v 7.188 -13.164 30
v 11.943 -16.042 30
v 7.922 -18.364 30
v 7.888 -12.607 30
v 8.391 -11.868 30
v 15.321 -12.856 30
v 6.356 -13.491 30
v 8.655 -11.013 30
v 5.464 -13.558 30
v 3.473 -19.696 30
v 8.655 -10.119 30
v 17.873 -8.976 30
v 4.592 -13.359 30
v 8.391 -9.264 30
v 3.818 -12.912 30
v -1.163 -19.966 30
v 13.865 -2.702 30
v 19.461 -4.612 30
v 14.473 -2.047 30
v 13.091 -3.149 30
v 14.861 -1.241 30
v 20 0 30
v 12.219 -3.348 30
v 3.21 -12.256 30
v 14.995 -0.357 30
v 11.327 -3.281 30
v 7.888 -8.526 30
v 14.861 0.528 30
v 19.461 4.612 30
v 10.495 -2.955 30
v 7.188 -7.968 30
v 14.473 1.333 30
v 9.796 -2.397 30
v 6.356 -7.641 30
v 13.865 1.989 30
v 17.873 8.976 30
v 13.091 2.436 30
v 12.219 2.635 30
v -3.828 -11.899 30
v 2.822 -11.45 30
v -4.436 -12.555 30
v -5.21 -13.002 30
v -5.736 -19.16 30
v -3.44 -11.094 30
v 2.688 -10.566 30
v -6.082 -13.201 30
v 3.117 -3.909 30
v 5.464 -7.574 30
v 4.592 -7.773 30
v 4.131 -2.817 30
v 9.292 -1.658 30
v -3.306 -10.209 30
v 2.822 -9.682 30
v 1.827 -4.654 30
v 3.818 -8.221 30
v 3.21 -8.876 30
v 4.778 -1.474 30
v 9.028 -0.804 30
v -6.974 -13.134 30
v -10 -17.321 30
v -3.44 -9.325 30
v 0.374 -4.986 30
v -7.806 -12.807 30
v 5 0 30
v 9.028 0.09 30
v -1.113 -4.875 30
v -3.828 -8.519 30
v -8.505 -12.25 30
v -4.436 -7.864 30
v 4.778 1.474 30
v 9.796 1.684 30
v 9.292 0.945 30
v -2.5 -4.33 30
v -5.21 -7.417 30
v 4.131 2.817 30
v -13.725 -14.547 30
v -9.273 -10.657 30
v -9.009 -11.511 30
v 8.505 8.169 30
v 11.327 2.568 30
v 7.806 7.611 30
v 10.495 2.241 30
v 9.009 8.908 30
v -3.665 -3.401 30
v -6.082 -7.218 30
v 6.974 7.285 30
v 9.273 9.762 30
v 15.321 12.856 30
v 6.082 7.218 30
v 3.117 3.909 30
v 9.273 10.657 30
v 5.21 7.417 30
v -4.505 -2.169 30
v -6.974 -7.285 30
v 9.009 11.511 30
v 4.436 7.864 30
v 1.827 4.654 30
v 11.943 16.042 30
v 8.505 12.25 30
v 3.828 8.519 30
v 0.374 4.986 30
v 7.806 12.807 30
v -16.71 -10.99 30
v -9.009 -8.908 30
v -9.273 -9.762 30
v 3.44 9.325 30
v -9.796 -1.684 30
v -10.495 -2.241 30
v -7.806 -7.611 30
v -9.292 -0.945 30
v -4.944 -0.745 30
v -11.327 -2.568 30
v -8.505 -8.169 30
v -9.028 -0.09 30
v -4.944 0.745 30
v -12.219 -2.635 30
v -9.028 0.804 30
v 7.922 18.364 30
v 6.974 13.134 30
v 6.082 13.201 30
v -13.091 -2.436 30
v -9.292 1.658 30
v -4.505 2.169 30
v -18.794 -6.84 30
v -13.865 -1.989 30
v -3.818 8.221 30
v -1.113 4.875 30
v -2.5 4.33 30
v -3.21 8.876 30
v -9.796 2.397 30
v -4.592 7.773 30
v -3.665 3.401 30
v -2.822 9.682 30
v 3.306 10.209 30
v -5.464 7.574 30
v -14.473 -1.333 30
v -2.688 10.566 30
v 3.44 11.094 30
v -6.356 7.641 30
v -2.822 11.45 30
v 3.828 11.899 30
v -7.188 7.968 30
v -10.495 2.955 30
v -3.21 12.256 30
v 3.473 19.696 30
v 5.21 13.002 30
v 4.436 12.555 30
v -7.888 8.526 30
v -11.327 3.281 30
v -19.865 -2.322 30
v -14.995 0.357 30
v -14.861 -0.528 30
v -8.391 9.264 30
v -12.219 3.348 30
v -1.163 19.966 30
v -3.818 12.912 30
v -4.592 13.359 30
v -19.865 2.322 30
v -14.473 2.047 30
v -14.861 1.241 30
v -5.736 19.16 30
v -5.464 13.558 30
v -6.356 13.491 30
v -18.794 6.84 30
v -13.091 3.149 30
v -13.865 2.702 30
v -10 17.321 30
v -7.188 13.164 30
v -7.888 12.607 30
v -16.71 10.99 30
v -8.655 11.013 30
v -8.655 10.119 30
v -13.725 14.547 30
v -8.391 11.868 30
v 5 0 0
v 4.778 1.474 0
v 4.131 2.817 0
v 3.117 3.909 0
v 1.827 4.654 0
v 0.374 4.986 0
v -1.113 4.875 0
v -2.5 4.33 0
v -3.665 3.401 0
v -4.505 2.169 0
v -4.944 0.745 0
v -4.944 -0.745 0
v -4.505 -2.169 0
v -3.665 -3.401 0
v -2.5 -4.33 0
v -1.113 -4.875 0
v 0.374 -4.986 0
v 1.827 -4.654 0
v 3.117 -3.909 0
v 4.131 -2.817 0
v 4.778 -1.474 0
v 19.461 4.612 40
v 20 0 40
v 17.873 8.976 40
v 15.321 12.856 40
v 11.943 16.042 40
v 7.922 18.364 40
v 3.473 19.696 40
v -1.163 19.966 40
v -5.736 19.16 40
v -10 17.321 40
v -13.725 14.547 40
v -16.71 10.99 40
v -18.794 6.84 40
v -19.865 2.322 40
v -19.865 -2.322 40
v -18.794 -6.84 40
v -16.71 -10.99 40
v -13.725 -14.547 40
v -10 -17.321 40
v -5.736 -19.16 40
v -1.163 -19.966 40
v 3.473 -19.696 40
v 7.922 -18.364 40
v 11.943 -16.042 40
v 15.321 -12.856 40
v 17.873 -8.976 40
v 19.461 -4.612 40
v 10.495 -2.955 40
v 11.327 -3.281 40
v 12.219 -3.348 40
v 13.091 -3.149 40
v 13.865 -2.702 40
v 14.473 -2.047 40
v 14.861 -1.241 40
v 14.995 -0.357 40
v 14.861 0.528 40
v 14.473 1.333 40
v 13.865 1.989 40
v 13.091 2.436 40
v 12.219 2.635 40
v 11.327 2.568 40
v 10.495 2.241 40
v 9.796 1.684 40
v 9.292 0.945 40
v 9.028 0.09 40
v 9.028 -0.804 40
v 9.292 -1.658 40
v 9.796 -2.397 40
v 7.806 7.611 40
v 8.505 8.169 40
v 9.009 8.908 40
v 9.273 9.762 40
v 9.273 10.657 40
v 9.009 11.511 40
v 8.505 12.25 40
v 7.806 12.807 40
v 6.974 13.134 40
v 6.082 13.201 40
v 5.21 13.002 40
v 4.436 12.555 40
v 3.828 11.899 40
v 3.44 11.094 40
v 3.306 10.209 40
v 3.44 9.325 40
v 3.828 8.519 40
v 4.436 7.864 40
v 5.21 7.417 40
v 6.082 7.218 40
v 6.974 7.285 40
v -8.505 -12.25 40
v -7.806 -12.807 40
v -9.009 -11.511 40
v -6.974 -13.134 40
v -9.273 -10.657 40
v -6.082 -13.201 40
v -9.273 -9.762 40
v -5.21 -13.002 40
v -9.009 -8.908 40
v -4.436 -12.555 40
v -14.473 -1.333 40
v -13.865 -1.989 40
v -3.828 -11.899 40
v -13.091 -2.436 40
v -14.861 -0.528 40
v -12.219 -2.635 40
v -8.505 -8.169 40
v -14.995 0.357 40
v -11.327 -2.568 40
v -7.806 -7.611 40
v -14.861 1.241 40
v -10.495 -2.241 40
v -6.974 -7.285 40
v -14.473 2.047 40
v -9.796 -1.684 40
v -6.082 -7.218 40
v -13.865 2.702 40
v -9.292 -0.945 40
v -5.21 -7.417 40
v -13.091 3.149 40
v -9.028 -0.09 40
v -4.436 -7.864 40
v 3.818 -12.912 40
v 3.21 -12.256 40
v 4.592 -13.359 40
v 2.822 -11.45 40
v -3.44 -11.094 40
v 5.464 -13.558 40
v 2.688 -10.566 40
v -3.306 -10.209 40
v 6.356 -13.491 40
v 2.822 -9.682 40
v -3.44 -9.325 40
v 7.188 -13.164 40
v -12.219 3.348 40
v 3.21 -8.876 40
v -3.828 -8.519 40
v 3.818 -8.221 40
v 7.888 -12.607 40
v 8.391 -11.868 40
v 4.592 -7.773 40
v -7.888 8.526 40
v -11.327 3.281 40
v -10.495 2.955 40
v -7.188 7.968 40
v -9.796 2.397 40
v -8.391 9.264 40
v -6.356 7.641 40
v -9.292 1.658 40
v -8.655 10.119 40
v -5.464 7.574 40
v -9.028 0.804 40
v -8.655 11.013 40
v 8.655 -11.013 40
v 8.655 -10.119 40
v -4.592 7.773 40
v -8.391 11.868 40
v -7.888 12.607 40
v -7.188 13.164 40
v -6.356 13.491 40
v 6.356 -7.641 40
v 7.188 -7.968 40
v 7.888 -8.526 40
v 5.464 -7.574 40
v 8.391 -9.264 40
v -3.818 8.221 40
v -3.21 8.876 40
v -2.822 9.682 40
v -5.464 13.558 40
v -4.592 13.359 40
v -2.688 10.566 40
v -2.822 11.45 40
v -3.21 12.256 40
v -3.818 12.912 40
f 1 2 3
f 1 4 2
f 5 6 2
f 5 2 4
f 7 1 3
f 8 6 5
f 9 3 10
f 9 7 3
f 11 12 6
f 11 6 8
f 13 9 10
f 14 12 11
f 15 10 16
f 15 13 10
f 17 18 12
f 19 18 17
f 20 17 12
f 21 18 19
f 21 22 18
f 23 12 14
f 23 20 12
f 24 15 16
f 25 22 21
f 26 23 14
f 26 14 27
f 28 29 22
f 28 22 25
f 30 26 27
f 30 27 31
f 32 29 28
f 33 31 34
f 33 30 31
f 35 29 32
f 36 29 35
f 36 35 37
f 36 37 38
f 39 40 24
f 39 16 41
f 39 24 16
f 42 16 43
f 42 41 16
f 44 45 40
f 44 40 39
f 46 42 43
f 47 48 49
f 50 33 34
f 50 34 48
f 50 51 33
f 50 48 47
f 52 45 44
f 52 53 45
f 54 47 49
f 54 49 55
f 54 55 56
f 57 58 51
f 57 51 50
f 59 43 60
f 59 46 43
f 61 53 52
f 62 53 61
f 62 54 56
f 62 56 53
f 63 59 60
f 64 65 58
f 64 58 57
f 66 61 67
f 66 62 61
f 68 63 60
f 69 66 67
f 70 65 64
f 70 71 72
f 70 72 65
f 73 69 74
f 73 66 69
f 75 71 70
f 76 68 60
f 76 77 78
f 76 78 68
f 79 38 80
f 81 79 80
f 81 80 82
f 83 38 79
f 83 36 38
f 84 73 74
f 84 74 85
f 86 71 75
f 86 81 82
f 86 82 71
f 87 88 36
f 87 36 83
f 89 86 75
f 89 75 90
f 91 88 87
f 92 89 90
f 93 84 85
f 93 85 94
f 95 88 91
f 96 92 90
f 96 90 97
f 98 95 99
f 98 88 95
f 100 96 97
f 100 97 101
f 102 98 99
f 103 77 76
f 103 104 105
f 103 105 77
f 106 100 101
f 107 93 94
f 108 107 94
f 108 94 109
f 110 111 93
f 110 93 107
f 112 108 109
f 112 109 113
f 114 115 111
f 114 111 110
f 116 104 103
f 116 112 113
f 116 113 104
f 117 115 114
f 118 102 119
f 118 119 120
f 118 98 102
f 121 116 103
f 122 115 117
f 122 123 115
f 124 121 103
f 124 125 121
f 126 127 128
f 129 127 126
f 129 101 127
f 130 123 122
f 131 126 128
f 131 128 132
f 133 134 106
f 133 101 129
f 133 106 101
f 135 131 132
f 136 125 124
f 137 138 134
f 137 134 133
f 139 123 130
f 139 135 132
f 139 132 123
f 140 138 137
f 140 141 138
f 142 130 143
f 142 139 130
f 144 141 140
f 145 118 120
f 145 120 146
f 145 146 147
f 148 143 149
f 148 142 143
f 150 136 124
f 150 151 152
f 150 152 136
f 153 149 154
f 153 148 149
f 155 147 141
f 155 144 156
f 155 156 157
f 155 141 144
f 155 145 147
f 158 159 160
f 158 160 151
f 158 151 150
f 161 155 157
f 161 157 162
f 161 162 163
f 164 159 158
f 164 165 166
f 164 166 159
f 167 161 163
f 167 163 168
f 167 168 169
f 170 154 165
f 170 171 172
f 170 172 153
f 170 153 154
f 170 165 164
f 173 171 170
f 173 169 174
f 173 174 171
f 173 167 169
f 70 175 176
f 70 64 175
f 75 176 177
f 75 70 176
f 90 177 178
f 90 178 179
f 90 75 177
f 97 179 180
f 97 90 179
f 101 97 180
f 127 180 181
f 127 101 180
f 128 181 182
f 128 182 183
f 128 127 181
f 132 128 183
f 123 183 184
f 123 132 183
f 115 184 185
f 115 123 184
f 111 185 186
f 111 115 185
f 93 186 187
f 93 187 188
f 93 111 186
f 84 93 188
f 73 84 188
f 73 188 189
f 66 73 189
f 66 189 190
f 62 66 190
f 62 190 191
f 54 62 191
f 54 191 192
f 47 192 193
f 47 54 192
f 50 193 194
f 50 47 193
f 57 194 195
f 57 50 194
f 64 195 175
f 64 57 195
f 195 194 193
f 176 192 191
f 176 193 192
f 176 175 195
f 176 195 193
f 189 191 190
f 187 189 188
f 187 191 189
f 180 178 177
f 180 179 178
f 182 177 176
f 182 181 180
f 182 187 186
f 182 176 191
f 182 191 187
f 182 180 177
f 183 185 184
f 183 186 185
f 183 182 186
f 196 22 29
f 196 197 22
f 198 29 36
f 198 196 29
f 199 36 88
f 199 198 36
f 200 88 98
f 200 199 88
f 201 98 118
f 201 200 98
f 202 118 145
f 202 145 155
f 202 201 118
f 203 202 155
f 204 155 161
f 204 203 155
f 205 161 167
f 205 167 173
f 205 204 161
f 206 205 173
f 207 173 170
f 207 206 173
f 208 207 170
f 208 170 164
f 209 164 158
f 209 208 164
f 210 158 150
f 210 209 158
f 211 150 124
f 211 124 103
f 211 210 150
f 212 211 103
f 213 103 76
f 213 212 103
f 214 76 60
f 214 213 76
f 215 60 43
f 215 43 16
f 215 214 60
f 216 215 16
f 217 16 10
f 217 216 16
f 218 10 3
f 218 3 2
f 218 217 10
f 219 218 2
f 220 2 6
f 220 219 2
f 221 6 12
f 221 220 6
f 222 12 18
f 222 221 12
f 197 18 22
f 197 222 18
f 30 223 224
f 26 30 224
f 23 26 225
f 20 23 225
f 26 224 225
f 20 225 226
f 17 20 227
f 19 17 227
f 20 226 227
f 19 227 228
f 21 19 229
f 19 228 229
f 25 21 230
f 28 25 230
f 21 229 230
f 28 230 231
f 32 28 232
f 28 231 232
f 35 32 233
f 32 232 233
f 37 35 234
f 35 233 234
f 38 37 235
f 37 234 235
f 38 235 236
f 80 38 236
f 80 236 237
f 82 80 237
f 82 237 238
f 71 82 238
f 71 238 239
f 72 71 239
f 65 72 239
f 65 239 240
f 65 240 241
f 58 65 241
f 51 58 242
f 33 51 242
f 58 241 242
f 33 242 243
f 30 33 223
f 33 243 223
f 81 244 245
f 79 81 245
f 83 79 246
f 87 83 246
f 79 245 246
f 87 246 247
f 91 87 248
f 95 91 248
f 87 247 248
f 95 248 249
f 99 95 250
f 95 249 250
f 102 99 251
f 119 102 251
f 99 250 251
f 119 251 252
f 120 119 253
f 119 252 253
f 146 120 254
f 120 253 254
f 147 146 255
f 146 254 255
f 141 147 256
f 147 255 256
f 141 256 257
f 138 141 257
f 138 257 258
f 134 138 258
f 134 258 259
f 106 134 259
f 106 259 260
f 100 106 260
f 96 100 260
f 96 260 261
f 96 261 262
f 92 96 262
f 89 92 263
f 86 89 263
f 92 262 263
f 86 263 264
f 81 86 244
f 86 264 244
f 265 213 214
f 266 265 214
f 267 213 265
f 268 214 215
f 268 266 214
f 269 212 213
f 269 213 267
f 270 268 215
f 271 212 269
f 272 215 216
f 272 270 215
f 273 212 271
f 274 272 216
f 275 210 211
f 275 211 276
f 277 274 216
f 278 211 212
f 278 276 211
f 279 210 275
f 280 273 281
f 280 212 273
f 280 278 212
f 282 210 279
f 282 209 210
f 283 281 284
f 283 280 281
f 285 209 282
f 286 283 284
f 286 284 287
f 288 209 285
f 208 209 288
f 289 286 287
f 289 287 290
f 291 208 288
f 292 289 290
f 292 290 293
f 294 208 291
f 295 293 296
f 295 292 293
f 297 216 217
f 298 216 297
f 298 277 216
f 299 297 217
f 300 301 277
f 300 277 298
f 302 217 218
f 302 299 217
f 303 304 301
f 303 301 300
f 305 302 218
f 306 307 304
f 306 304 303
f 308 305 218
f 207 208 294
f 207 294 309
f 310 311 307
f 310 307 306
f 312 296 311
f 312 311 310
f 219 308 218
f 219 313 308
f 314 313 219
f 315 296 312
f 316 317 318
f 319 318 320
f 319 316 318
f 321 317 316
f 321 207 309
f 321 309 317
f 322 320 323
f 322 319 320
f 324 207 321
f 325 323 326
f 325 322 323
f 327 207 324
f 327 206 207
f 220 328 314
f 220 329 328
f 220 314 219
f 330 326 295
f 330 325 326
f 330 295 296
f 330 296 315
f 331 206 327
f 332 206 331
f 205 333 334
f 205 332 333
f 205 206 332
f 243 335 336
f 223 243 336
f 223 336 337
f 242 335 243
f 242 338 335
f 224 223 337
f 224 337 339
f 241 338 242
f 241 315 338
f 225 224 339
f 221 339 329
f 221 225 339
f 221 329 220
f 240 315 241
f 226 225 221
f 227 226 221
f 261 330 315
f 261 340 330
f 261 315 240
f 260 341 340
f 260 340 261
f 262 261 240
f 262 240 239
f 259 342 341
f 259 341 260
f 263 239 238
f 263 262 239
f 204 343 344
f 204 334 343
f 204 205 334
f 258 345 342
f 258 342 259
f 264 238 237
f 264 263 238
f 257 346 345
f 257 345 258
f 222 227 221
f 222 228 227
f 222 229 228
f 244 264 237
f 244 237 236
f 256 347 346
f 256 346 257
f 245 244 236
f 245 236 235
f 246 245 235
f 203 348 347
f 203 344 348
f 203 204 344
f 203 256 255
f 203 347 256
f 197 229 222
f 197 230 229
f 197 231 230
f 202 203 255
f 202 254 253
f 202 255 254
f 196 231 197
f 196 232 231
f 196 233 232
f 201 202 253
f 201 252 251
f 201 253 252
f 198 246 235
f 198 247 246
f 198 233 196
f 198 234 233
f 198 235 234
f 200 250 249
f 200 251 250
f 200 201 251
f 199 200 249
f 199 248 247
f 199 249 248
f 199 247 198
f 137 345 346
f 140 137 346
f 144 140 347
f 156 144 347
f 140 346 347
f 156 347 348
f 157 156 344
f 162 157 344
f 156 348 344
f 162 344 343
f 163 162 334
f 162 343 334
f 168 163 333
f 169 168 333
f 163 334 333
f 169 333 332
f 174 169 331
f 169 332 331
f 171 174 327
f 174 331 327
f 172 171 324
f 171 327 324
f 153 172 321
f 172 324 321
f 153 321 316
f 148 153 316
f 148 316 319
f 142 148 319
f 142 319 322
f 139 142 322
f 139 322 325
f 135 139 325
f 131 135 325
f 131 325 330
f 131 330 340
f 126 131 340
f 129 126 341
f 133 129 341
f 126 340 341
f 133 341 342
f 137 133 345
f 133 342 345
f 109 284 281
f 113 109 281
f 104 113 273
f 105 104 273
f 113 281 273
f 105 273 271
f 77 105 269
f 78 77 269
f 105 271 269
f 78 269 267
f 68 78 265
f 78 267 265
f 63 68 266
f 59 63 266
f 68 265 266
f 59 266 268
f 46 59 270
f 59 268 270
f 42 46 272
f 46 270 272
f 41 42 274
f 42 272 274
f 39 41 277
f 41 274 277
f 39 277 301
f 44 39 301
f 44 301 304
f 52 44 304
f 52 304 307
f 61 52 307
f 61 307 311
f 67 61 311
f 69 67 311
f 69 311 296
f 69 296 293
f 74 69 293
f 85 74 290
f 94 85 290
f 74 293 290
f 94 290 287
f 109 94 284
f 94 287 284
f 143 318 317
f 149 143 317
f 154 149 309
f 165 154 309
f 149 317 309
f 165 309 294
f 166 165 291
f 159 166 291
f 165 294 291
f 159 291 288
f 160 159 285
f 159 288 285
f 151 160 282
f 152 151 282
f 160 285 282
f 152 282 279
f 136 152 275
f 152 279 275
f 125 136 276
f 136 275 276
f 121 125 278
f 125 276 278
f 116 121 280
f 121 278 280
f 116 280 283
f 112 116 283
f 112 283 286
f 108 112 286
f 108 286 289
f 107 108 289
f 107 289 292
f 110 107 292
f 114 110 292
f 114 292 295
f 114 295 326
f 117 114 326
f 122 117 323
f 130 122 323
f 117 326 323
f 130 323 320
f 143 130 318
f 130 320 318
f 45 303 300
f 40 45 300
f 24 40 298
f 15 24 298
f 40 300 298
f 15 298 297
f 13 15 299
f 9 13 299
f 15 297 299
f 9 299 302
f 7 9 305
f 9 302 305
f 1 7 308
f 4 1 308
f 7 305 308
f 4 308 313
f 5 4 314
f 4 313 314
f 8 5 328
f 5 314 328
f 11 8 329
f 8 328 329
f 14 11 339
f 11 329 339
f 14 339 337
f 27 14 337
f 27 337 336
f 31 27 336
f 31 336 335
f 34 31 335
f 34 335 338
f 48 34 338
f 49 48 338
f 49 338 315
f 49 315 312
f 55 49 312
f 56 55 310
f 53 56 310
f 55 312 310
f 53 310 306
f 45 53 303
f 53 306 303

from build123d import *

# Parameters (mm, degrees)
SKETCH001_R        = 3
POCKET_DEPTH       = 10
POLARPATTERN_COUNT = 6


with BuildPart() as part:
    # Sketch → Revolution (revolve)
    with BuildSketch(Plane.XZ):
        Polygon((0, 0), (5, 0), (5, 30), (20, 30), (20, 40), (0, 40), align=None)
    revolve(axis=Axis((0, 0, 0), (0, 0, 1)))

    # Sketch001 (on Face5 of Revolution) → Pocket (cut)
    with BuildSketch(Plane.XY.offset(40)):
        with Locations((-5.688479, 10.56604)):
            Circle(SKETCH001_R)
    pocket = extrude(amount=-POCKET_DEPTH, mode=Mode.SUBTRACT)

    # PolarPattern: Pocket ×6 about axis
    polarpattern_axis = Axis((0, 0, 40), (0, 0, 1))
    for i in range(1, POLARPATTERN_COUNT):
        add(pocket.rotate(polarpattern_axis, i * 360 / POLARPATTERN_COUNT), mode=Mode.SUBTRACT)


solid = part.part
